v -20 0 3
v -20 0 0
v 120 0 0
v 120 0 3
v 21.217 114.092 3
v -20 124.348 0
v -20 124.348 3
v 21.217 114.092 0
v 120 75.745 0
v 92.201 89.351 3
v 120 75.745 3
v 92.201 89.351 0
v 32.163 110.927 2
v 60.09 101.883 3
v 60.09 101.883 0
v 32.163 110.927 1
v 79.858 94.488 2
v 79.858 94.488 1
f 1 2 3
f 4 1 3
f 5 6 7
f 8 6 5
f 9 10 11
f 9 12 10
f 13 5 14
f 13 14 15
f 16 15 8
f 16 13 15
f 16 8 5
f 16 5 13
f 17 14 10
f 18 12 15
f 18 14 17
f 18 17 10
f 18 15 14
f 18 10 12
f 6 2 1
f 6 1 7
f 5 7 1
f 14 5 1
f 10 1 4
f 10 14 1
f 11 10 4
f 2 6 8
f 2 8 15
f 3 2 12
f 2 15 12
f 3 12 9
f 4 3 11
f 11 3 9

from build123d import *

# Parameters (mm, degrees)
F1_DEPTH = 3
F2_W     = 900
F2_H     = 300
F2_W_2   = 140
F2_H_2   = 295
F3_DEPTH = 25


with BuildPart() as f1:
    # F0 (on Top) → F1 (new body)
    with BuildSketch(Plane.XY):
        with BuildLine():
            Line((-155, 140), (-155, 0))
            Line((-155, 0), (155, 0))
            Line((155, 0), (155, 50))
            add(Edge.make_bspline(
                [(-155, 140), (-48.6499257386, 141.1626338959), (110.3091782722, 98.3189062543), (155, 50)],
                knots=[0, 0, 0, 0, 0.7100033564, 0.7100033564, 0.7100033564, 0.7100033564], degree=3))
        make_face()
        with BuildLine():
            Line((155, 50), (155, 0))
            Line((155, 0), (175, 0))
            add(Edge.make_bspline(
                [(155, 50), (173.2537000506, 30.2644304257), (172.4444180727, 9.6154557541), (175, 0)],
                knots=[0.7100033564, 0.7100033564, 0.7100033564, 0.7100033564, 1, 1, 1, 1], degree=3))
        make_face()
    extrude(amount=F1_DEPTH)


with BuildPart() as f3:
    # F2 (on Top) → F3 (new body)
    with BuildSketch(Plane.XY):
        Rectangle(F2_W, F2_H)
        Rectangle(F2_W_2, F2_H_2, mode=Mode.SUBTRACT)
    extrude(amount=F3_DEPTH)


with BuildPart() as f3_1:
    # F4: moved
    add(f3.part.moved(Location((50, 0, 0))))


with BuildPart() as f1_1:
    add(f1.part)

    # F5: cut F3
    add(f3_1.part, mode=Mode.SUBTRACT)


solid = f1_1.part
